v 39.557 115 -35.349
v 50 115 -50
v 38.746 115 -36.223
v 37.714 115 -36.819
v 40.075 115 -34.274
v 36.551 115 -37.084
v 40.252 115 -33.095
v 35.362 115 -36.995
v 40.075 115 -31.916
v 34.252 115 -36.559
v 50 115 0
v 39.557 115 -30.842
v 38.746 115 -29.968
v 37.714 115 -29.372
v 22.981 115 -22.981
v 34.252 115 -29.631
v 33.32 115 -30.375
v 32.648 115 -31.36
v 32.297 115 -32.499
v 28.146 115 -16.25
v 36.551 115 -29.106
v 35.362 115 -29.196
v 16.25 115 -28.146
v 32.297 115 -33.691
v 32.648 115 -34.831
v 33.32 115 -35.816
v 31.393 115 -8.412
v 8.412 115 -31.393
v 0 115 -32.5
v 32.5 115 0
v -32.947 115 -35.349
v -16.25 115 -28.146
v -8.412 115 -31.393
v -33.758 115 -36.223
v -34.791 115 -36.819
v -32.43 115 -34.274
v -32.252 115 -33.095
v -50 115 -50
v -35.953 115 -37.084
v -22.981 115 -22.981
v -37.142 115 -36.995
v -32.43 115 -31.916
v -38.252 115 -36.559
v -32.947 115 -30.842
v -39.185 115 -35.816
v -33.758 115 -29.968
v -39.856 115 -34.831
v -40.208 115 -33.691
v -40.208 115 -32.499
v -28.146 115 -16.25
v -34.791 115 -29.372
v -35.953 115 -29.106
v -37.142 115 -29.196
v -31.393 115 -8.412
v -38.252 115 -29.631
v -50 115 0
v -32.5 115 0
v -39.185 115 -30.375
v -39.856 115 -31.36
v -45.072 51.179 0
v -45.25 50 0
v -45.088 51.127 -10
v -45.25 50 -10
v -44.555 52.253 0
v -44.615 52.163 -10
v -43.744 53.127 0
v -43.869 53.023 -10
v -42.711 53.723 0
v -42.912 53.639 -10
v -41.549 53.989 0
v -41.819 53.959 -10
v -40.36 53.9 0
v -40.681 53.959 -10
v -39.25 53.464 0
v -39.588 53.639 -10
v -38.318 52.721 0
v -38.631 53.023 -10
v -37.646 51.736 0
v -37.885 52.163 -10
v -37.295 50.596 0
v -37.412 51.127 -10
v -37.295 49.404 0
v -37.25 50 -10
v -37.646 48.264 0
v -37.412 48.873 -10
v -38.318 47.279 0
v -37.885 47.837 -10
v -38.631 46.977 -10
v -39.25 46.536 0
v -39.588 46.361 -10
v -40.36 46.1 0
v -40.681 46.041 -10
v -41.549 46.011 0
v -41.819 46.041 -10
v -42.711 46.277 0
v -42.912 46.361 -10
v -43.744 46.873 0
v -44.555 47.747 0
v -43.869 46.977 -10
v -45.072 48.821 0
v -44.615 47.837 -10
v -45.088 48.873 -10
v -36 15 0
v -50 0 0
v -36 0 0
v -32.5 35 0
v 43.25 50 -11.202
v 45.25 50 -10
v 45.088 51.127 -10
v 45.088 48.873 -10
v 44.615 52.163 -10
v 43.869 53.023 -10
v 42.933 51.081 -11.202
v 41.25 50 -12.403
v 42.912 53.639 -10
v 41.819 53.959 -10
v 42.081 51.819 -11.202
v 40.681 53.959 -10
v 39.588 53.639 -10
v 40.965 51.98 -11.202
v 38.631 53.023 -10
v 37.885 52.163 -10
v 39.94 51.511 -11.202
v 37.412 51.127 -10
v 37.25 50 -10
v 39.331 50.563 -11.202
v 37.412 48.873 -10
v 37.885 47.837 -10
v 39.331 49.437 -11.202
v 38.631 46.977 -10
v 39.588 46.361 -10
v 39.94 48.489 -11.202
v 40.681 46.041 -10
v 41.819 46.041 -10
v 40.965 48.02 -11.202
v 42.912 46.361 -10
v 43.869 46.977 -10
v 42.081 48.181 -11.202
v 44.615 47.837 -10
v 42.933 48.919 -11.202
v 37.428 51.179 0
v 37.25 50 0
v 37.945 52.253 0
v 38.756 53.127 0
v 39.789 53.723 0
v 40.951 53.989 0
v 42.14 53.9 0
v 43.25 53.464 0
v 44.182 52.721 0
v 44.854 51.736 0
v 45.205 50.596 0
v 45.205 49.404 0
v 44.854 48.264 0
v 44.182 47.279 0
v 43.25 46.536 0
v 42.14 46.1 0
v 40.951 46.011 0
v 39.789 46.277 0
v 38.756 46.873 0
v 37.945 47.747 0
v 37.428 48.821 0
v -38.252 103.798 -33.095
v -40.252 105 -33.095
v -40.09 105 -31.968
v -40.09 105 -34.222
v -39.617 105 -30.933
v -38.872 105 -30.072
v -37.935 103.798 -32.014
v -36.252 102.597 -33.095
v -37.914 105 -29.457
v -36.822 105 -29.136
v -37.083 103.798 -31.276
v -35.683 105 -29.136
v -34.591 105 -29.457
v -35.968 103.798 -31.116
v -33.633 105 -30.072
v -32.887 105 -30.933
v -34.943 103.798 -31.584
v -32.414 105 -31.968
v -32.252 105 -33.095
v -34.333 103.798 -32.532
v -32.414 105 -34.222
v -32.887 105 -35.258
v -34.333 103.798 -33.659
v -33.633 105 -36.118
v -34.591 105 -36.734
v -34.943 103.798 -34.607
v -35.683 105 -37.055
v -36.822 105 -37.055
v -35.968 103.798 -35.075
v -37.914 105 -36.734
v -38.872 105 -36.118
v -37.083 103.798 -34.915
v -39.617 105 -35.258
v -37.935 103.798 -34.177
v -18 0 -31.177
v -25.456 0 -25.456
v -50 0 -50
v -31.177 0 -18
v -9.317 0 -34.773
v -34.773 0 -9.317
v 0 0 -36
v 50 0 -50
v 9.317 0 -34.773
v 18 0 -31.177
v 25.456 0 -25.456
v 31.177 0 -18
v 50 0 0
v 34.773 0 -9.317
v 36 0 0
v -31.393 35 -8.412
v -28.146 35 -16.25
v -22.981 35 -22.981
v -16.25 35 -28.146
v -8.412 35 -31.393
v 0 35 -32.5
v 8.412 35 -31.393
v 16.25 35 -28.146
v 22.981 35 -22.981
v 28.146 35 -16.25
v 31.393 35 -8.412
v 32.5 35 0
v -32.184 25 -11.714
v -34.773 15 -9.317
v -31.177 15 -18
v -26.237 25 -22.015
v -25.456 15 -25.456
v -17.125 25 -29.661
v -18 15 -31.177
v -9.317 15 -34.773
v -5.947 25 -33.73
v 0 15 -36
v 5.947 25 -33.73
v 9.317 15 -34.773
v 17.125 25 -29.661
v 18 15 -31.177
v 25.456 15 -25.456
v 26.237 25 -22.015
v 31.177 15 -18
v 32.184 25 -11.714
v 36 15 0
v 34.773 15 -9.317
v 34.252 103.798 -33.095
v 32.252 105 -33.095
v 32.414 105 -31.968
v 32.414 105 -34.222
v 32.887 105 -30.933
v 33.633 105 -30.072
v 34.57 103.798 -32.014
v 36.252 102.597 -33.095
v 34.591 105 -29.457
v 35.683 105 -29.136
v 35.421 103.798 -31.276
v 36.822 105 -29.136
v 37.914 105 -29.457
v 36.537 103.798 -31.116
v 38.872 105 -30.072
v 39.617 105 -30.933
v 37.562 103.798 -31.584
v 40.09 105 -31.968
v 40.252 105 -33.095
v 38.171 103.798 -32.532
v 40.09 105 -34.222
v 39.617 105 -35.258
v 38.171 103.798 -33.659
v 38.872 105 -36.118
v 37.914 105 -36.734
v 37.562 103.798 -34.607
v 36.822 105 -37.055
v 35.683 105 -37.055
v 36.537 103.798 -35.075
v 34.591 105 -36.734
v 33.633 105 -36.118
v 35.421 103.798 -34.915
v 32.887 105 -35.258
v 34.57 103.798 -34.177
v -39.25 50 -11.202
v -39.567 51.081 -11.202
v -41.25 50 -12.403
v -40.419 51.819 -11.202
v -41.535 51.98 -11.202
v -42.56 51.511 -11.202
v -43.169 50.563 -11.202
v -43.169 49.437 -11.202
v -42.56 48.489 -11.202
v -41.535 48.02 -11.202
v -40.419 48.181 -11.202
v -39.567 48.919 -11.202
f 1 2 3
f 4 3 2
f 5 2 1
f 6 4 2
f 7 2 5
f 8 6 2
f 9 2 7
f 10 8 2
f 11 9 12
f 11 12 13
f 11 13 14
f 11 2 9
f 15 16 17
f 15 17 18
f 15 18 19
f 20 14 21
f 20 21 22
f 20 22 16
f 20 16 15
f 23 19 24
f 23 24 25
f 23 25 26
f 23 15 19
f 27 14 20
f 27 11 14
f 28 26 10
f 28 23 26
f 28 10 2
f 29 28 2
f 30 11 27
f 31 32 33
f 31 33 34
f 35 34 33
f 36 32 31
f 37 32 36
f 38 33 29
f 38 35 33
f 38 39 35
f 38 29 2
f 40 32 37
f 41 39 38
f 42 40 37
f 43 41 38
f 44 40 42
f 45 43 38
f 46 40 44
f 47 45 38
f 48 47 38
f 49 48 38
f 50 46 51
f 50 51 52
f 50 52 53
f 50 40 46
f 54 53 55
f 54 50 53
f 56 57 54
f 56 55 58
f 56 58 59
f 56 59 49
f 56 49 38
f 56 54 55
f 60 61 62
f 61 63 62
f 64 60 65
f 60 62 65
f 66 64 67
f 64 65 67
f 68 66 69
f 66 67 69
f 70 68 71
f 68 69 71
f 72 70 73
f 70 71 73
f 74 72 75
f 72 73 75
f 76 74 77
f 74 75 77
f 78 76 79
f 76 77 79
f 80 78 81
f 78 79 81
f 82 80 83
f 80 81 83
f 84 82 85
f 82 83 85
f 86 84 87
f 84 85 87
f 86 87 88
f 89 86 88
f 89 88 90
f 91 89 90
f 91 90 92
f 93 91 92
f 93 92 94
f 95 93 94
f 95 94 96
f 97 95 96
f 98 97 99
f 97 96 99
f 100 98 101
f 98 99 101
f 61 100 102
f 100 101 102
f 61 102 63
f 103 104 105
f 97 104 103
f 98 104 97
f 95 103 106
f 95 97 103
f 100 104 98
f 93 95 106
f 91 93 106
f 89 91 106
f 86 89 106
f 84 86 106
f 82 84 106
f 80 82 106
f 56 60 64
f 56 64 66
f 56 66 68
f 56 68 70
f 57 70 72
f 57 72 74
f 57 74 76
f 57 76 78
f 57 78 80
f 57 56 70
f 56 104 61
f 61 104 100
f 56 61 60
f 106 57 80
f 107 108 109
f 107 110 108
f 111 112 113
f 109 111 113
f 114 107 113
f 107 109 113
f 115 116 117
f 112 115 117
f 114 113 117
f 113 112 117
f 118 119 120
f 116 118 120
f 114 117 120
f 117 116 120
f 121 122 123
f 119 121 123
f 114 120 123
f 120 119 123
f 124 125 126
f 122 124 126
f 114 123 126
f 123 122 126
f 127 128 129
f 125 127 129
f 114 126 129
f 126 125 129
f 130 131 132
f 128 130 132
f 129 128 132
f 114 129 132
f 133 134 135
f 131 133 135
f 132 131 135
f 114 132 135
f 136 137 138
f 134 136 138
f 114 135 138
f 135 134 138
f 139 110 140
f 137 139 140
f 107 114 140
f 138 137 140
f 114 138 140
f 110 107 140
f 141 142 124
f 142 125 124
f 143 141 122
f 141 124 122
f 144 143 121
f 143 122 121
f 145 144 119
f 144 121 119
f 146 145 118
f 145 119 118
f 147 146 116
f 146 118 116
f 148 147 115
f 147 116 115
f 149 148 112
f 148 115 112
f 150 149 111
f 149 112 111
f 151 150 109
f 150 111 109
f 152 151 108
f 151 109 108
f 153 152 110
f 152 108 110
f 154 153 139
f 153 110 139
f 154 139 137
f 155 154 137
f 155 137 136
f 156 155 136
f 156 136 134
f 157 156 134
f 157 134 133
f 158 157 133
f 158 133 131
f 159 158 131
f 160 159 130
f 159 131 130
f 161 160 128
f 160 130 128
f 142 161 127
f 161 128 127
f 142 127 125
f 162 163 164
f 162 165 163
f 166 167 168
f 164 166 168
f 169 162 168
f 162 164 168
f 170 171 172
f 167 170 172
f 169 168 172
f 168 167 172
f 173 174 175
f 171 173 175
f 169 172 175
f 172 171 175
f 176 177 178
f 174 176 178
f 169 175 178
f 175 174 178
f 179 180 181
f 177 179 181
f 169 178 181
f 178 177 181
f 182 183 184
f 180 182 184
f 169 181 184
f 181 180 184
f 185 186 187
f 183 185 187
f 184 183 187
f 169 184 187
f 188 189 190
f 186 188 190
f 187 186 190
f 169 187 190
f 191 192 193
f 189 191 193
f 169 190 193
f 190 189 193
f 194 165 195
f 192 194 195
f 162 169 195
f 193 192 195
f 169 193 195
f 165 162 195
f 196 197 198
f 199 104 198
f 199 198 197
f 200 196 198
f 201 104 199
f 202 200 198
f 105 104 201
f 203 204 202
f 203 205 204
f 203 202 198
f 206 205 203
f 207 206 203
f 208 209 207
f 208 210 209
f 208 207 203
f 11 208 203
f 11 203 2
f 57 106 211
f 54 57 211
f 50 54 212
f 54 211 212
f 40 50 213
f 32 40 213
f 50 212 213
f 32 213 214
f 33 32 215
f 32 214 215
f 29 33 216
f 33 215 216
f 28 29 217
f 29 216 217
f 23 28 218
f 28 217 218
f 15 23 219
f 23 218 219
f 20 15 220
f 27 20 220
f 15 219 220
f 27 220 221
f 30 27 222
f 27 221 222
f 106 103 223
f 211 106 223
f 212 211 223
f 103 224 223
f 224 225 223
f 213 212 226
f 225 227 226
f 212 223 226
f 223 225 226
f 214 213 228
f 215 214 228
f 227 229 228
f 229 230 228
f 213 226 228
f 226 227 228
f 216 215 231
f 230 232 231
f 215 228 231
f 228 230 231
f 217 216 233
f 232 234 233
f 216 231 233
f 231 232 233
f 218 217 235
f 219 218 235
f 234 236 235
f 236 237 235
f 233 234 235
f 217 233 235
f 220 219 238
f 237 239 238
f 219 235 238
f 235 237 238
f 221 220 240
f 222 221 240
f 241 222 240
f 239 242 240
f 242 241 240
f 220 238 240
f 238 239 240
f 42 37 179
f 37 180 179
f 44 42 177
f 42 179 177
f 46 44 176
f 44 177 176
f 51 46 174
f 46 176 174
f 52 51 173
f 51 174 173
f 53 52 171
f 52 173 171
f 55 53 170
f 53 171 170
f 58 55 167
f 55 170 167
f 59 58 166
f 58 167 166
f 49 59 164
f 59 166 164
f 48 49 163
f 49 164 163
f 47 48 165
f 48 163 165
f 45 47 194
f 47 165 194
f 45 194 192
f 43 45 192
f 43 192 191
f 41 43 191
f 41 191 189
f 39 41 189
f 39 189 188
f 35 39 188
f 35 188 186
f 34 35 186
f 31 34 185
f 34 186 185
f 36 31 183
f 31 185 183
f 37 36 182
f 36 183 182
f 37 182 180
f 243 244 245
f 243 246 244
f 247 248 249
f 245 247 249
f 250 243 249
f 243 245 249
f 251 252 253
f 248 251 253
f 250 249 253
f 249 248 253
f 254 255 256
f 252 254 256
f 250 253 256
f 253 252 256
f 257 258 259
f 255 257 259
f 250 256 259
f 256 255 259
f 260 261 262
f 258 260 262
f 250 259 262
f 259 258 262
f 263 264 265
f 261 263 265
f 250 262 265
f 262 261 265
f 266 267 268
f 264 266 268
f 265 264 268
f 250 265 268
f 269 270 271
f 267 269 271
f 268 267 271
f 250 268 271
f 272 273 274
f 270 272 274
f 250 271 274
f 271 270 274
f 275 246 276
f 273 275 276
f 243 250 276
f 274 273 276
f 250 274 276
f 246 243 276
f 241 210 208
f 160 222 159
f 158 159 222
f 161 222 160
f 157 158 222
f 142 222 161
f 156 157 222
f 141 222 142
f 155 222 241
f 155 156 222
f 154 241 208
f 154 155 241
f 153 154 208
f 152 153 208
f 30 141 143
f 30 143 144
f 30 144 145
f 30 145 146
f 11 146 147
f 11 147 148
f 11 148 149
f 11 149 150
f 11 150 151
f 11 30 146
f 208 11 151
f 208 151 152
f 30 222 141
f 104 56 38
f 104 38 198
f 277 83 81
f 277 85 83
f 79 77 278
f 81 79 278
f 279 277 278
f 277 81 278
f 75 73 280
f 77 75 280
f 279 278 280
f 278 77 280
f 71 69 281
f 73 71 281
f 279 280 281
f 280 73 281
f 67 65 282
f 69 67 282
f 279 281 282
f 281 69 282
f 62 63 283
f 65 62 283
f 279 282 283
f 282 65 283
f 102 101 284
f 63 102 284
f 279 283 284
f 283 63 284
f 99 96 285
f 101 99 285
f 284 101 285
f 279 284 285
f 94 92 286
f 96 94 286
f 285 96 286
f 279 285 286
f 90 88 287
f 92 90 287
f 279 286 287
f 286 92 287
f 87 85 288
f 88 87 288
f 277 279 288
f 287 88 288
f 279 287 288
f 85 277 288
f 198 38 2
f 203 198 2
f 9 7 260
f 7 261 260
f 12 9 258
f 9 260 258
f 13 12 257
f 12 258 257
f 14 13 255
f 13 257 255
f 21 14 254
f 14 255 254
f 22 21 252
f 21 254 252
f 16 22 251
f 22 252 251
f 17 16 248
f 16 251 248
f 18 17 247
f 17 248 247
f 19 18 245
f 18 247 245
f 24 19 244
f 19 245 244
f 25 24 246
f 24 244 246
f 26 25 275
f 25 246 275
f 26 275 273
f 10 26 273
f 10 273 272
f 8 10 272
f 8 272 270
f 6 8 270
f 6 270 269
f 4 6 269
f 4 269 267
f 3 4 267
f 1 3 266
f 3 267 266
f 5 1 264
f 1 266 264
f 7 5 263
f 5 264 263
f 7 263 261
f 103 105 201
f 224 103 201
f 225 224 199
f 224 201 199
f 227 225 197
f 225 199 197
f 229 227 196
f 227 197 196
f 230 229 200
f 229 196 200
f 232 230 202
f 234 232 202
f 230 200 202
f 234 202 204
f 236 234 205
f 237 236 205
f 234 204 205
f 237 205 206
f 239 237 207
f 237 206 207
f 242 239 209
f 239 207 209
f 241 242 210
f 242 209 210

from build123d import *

# Parameters (mm, degrees)
F2_DEPTH = 50
F5_D     = 8
F5_DEPTH = 10
F5_TIP   = 2.4034424761
F7_D     = 8
F7_DEPTH = 20
F7_TIP   = 2.4034424761
F8_DEPTH = 10


with BuildPart() as f2:
    # F1 (on Top) → F2 (new body)
    with BuildSketch(Plane.XY):
        Polygon((-50, 0), (0, 0), (50, 0), (50, 125), (-50, 125), align=None)
    extrude(amount=-F2_DEPTH)

    # F0 (on Top) → F3 (revolve, cut)
    with BuildSketch(Plane.XY):
        Polygon((-36, 0), (0, 0), (0, 125), (-32.5, 125), (-32.5, 35), (-36, 15), align=None)
    revolve(axis=Axis((0, 62.5, 0), (0, -1, 0)), mode=Mode.SUBTRACT)

    # F5
    with Locations(Plane.XY):
        with Locations((-41.25, 50), (41.25, 50)):
            Hole(F5_D / 2, depth=F5_DEPTH)
            with Locations((0, 0, -(F5_DEPTH + F5_TIP / 2))):  # 118° drill point
                Cone(0, F5_D / 2, F5_TIP, mode=Mode.SUBTRACT)

    # F7
    with Locations(Plane(origin=(0, 125, 0), x_dir=(-1, 0, 0), z_dir=(0, 1, 0))):
        with Locations((-36.2523114815, -33.0952695304), (36.2523114815, -33.0952695304)):
            Hole(F7_D / 2, depth=F7_DEPTH)
            with Locations((0, 0, -(F7_DEPTH + F7_TIP / 2))):  # 118° drill point
                Cone(0, F7_D / 2, F7_TIP, mode=Mode.SUBTRACT)

    # F8 (cut): a face of the model
    f8_faces = [f2.faces().sort_by_distance(p)[0] for p in [
        (41.25, 125, -1.1180339887),
    ]]
    extrude(f8_faces, amount=-F8_DEPTH, mode=Mode.SUBTRACT)


solid = f2.part
